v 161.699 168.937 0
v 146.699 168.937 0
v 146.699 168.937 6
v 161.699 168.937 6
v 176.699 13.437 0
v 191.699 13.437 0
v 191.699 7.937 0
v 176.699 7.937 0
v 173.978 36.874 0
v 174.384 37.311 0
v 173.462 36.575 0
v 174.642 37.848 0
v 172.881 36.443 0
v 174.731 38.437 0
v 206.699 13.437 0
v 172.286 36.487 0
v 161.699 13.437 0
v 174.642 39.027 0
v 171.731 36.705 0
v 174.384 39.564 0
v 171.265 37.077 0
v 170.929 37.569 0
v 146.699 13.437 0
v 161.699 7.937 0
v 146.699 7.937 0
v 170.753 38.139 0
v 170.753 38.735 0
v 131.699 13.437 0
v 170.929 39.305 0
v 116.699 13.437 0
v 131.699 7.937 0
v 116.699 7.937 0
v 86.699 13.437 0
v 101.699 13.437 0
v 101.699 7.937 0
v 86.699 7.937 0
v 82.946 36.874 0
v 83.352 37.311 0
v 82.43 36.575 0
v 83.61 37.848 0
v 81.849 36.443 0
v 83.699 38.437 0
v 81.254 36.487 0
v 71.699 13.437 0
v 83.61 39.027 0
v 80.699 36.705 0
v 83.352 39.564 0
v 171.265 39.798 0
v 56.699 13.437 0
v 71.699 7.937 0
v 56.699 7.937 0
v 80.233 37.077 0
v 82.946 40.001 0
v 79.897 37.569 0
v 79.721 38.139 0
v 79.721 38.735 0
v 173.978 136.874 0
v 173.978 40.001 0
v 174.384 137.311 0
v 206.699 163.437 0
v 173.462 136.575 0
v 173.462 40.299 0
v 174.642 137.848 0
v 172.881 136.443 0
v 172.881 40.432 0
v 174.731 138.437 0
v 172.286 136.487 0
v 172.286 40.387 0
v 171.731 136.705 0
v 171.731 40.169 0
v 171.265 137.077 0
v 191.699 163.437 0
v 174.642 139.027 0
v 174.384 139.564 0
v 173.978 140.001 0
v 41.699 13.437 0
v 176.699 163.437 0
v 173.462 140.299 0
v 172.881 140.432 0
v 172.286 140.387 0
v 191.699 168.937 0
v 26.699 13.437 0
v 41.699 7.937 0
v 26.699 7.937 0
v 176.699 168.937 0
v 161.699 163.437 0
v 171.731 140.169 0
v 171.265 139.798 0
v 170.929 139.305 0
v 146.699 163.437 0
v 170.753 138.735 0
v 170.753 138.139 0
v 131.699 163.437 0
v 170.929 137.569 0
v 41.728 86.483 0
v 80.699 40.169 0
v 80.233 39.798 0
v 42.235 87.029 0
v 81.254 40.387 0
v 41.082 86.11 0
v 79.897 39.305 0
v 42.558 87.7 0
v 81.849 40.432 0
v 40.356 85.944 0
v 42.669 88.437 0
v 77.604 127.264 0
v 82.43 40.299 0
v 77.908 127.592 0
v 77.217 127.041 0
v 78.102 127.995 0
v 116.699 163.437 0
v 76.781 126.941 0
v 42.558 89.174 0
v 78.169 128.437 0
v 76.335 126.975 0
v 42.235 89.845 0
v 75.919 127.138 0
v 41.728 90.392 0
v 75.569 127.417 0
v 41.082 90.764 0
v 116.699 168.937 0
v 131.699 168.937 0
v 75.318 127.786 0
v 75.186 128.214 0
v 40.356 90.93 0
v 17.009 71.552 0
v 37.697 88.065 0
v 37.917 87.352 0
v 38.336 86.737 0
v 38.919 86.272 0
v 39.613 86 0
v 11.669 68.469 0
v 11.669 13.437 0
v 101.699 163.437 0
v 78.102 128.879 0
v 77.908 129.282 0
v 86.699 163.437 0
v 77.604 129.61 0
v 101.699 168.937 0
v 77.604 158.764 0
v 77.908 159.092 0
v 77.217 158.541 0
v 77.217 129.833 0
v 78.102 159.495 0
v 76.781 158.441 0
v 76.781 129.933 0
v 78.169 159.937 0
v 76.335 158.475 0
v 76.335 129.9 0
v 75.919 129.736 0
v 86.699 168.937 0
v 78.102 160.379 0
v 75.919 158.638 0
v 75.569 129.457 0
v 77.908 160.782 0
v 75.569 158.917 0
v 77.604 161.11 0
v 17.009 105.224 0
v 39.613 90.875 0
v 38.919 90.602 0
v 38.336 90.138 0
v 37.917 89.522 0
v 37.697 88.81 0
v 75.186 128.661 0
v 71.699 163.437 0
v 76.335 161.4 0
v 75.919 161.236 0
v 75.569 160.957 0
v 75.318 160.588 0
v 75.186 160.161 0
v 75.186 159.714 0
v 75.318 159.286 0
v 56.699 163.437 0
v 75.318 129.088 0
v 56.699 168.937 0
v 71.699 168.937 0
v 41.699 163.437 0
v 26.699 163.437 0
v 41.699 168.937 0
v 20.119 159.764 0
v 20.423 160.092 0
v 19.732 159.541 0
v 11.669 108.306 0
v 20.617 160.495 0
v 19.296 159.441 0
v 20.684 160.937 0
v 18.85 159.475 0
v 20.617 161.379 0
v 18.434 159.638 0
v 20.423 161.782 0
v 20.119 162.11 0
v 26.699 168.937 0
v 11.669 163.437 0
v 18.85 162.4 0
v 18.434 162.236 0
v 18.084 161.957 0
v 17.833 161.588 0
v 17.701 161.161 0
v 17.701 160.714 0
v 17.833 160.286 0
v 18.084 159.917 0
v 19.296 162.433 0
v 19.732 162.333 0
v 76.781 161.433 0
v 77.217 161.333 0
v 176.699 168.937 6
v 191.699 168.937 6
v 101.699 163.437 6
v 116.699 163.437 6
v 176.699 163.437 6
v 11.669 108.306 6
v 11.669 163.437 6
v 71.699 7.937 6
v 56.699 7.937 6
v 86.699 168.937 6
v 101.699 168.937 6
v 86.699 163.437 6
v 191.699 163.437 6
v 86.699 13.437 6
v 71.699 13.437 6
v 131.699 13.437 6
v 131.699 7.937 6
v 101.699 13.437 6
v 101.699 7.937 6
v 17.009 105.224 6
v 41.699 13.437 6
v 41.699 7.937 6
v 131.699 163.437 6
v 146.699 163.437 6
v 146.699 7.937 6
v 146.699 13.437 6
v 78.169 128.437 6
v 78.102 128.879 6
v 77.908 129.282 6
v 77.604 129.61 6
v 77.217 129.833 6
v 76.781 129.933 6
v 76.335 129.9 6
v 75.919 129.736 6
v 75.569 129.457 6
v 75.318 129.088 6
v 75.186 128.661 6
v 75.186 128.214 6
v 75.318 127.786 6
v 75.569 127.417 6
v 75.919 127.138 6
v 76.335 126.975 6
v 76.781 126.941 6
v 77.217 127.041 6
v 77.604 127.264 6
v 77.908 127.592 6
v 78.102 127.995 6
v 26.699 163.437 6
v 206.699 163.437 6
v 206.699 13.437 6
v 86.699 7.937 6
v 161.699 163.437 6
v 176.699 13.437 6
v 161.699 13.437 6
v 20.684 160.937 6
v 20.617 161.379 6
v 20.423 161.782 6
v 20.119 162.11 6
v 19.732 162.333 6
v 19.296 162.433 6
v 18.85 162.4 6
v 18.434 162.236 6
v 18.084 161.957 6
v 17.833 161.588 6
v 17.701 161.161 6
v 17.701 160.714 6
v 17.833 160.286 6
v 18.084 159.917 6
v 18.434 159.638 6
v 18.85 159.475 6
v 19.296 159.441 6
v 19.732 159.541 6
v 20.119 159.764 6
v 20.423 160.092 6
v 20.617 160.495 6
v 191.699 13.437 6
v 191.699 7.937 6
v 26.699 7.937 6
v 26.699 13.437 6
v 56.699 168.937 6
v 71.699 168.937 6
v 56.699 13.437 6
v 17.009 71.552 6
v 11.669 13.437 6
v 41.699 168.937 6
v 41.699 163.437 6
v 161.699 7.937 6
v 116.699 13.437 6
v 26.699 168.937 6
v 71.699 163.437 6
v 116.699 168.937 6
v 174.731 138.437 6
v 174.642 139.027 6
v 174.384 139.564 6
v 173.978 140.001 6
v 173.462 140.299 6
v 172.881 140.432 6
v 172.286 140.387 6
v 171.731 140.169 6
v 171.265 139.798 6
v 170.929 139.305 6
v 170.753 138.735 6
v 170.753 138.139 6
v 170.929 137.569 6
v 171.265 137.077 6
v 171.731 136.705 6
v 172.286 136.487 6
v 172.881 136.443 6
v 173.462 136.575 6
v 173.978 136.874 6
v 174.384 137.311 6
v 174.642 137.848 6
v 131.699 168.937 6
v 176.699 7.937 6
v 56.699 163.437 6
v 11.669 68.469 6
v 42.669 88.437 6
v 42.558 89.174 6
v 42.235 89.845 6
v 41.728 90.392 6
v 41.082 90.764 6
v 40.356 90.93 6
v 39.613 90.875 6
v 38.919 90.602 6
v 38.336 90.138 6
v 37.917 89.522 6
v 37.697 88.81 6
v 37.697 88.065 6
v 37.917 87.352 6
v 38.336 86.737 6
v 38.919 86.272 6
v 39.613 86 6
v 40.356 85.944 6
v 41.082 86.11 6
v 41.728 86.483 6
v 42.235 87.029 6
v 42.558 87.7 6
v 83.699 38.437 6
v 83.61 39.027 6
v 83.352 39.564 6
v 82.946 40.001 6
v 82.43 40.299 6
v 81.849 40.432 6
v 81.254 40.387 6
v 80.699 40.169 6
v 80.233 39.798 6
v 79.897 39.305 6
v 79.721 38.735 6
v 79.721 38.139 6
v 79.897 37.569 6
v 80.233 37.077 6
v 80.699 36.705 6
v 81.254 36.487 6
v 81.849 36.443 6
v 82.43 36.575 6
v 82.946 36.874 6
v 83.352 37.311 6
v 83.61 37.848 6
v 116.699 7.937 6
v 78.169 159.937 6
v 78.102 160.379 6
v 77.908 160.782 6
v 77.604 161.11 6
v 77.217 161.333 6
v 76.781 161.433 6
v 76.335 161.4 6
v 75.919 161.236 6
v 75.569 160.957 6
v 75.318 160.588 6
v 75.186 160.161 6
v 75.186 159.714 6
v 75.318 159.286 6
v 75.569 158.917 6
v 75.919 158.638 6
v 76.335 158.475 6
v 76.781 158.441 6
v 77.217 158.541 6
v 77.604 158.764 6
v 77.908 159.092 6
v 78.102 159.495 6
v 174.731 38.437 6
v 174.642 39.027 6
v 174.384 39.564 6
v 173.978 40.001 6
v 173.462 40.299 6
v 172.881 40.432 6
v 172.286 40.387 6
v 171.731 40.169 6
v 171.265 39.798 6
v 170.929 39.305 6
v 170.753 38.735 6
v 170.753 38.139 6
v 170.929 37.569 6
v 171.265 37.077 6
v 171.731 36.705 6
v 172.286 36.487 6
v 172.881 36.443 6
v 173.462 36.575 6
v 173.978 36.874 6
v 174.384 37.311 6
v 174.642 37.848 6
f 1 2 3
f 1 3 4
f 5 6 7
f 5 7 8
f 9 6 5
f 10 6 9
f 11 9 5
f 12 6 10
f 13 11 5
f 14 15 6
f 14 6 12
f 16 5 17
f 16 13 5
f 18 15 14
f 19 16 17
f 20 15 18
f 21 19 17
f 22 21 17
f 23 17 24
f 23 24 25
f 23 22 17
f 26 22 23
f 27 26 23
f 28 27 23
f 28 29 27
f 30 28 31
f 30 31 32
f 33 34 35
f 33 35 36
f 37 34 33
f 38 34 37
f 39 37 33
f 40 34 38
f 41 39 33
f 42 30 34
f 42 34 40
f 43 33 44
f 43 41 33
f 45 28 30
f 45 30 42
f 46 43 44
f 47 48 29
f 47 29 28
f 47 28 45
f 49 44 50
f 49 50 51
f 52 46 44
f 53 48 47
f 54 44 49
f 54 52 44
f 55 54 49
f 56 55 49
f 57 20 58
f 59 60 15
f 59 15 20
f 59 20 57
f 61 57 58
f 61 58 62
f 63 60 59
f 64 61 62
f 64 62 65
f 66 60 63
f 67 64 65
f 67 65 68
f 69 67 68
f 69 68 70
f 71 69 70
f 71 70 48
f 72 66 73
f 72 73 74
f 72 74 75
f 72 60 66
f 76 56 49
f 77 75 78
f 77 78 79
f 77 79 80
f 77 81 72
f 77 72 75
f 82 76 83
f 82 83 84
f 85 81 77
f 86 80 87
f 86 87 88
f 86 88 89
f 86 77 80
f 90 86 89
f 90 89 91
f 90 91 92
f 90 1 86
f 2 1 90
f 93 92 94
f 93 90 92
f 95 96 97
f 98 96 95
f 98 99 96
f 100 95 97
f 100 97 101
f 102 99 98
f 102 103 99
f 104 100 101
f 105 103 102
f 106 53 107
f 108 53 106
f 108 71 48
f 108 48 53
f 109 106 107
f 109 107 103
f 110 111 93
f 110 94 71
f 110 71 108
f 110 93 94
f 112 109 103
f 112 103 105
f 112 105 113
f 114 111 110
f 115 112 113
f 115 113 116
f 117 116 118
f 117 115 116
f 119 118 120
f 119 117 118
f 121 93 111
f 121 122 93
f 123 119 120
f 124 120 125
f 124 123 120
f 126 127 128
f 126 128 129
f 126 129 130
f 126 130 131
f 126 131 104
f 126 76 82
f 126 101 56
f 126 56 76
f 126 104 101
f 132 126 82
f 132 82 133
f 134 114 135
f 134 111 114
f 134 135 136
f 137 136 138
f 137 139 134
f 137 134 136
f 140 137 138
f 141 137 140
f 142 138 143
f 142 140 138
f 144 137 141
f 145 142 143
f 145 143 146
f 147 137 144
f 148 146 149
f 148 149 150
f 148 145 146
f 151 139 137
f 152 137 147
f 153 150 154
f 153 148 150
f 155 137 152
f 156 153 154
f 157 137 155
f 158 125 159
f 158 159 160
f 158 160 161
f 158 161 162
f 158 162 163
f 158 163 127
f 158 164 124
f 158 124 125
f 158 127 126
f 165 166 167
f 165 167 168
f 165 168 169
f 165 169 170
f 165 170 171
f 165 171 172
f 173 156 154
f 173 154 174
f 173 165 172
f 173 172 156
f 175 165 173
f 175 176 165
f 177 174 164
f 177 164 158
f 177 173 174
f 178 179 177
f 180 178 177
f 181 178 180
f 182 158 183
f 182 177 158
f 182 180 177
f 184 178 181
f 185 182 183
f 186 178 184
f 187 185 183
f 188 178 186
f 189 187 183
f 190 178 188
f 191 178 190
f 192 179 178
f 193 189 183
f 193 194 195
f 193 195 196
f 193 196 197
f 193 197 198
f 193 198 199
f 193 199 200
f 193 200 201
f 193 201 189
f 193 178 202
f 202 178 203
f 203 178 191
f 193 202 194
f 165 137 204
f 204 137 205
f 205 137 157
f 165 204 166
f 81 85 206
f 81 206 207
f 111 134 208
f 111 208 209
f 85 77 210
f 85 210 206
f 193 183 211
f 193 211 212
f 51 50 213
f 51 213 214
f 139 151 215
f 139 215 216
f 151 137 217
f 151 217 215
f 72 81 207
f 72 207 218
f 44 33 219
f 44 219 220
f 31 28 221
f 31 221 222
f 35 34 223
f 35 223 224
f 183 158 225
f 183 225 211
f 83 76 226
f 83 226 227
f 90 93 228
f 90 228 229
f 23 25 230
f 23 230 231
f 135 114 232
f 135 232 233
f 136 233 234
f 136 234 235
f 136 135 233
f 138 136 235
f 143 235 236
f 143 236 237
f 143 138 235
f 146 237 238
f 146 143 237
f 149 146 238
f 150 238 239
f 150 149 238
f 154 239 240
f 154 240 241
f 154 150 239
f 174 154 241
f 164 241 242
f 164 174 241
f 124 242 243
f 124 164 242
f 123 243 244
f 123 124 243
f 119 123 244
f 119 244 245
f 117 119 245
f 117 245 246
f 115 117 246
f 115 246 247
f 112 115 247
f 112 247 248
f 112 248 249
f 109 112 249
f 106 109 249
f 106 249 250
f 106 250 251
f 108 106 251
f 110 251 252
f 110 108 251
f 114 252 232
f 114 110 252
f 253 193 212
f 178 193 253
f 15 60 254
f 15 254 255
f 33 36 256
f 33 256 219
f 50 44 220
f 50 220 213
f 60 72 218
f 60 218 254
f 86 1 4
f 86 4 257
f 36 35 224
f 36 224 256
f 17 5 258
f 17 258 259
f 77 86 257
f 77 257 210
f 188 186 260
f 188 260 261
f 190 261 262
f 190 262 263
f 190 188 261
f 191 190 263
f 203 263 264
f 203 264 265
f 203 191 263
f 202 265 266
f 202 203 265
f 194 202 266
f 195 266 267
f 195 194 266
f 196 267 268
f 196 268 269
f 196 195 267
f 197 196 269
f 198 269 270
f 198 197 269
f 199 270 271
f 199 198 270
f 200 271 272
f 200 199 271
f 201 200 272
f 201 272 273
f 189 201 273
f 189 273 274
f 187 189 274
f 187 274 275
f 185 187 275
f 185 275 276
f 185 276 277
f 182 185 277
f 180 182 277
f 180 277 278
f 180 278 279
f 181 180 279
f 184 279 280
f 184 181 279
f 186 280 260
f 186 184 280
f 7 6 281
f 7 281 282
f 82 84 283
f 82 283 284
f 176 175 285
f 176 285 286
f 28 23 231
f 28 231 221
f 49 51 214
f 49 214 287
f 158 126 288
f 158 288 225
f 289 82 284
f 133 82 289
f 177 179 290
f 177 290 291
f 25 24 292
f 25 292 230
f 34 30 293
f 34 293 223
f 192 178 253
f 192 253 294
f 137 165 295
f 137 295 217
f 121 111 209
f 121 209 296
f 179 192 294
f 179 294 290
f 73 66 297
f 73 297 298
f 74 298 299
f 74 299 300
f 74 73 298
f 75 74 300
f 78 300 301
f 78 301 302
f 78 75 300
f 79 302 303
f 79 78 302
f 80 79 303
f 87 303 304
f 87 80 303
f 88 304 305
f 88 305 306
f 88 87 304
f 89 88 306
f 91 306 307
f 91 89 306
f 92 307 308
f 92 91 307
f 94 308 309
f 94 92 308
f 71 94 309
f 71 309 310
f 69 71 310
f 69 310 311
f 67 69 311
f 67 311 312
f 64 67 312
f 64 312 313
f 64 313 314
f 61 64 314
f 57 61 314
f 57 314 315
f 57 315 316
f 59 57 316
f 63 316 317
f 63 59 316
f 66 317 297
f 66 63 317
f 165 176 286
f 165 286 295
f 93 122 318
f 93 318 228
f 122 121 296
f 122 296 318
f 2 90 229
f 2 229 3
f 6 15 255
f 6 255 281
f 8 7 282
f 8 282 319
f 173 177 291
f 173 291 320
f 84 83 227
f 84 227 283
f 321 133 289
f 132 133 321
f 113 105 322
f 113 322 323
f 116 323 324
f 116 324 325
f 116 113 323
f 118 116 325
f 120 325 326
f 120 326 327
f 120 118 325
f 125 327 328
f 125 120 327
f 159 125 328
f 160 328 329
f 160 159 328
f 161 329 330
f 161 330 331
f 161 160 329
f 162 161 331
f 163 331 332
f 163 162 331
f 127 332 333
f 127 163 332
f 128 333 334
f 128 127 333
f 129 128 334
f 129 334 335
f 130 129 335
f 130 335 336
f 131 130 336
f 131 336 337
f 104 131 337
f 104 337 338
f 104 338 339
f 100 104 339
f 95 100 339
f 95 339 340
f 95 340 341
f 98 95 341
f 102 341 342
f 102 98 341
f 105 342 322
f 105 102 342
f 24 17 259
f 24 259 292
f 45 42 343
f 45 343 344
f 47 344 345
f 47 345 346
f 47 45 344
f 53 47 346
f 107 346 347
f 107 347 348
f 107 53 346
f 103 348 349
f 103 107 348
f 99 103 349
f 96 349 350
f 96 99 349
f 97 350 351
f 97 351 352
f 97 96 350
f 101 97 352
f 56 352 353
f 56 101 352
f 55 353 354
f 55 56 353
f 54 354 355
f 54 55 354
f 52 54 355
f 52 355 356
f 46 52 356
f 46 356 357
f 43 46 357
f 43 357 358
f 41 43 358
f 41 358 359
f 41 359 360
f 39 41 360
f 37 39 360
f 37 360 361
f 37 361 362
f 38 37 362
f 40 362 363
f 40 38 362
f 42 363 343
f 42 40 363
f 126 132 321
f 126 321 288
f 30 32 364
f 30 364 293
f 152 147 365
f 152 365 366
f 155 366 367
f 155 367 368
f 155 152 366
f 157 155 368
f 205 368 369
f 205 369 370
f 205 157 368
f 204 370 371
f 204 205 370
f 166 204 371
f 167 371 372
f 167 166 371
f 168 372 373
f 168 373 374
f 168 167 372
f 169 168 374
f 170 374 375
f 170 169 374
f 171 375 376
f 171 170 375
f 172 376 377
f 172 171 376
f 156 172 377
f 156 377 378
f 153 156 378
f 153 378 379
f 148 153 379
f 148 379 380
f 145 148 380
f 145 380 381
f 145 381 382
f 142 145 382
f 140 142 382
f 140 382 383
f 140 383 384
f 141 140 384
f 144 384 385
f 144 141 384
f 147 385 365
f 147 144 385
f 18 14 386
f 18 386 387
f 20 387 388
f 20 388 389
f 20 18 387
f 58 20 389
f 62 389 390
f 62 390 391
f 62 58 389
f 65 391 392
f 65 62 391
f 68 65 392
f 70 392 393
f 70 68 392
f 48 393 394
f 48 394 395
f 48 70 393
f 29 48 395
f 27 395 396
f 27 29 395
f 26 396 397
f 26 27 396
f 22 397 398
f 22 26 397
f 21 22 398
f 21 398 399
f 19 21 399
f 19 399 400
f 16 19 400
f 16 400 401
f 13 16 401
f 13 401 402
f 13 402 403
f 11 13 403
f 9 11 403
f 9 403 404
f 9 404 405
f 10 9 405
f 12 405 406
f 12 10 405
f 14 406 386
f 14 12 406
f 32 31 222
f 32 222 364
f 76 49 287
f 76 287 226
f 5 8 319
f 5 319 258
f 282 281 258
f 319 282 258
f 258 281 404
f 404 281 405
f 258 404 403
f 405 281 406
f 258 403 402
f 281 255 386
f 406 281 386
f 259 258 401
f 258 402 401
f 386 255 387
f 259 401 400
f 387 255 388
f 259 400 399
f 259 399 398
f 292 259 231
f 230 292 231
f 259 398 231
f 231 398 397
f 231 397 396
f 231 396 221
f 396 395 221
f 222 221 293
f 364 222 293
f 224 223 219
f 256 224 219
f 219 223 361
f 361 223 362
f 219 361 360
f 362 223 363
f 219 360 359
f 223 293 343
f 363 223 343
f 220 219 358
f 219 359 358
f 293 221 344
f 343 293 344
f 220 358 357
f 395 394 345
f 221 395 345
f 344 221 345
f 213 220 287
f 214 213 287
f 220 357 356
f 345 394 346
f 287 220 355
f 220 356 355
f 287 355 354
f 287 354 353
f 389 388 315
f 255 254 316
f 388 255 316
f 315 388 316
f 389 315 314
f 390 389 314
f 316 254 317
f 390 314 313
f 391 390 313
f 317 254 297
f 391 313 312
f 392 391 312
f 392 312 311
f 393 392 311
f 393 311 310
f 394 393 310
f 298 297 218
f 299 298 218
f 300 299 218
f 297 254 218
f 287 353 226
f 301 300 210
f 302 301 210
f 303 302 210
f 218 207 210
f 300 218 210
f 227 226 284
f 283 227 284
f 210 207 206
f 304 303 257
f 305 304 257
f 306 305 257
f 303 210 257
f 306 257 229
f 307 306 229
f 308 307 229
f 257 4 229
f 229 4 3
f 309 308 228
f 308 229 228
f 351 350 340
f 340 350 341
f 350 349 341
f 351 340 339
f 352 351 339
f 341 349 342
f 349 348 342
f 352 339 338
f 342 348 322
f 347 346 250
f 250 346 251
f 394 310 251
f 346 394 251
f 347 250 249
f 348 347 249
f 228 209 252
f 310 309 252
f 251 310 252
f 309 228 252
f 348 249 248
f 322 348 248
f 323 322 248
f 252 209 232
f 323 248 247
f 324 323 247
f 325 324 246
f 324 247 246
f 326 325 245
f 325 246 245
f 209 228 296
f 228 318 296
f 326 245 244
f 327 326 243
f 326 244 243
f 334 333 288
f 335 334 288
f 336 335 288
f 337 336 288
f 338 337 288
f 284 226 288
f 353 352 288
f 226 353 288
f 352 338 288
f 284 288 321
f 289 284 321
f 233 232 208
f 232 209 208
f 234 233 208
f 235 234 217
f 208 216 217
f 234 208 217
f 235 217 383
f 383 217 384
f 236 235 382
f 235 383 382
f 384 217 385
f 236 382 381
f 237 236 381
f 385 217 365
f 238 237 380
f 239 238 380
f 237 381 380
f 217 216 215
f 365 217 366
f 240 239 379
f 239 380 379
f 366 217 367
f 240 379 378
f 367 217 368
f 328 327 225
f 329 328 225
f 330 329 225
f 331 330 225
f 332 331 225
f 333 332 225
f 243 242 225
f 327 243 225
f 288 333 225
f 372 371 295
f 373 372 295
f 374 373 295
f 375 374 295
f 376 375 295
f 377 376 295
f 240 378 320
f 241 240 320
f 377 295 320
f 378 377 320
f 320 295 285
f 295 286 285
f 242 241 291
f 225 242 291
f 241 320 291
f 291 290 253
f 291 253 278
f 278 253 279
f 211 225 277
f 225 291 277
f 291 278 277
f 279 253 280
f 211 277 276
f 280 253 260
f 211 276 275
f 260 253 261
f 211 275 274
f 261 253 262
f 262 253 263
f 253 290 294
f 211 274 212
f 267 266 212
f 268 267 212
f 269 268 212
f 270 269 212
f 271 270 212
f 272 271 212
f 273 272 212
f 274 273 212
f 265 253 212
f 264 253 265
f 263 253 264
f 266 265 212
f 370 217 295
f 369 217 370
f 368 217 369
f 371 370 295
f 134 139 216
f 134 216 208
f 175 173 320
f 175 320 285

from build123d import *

# Parameters (mm, degrees)
MODEL_R             = 2.5
MODEL_R_2           = 2
MODEL_R_3           = 1.5
BOSS_EXTRUDE1_DEPTH = 6


with BuildPart() as part:
    # Model → Boss-Extrude1 (new body)
    with BuildSketch(Plane.XY):
        Polygon((206.699050252, 163.437183165), (206.699050252, 13.437183165), (191.699050252, 13.437183165), (191.699050252, 7.937183165), (176.699050252, 7.937183165), (176.699050252, 13.437183165), (161.699050252, 13.437183165), (161.699050252, 7.937183165), (146.699050252, 7.937183165), (146.699050252, 13.437183165), (131.699050252, 13.437183165), (131.699050252, 7.937183165), (116.699050252, 7.937183165), (116.699050252, 13.437183165), (101.699050252, 13.437183165), (101.699050252, 7.937183165), (86.699050252, 7.937183165), (86.699050252, 13.437183165), (71.699050252, 13.437183165), (71.699050252, 7.937183165), (56.699050252, 7.937183165), (56.699050252, 13.437183165), (41.699050252, 13.437183165), (41.699050252, 7.937183165), (26.699050252, 7.937183165), (26.699050252, 13.437183165), (11.668968128, 13.437183165), (11.668968128, 68.469250485), (17.008612601, 71.552095659), (17.008612601, 105.223573885), (11.668968128, 108.306419059), (11.668968128, 163.437183165), (26.699050252, 163.437183165), (26.699050252, 168.937183165), (41.699050252, 168.937183165), (41.699050252, 163.437183165), (56.699050252, 163.437183165), (56.699050252, 168.937183165), (71.699050252, 168.937183165), (71.699050252, 163.437183165), (86.699050252, 163.437183165), (86.699050252, 168.937183165), (101.699050252, 168.937183165), (101.699050252, 163.437183165), (116.699050252, 163.437183165), (116.699050252, 168.937183165), (131.699050252, 168.937183165), (131.699050252, 163.437183165), (146.699050252, 163.437183165), (146.699050252, 168.937183165), (161.699050252, 168.937183165), (161.699050252, 163.437183165), (176.699050252, 163.437183165), (176.699050252, 168.937183165), (191.699050252, 168.937183165), (191.699050252, 163.437183165), align=None)
        with Locations((40.168968128, 88.437183165)):
            Circle(MODEL_R, mode=Mode.SUBTRACT)
        with Locations((172.731128361, 138.437183165)):
            Circle(MODEL_R_2, mode=Mode.SUBTRACT)
        with Locations((81.699050252, 38.437183165)):
            Circle(MODEL_R_2, mode=Mode.SUBTRACT)
        with Locations((172.731128361, 38.437183165)):
            Circle(MODEL_R_2, mode=Mode.SUBTRACT)
        with Locations((76.668968128, 128.437183165)):
            Circle(MODEL_R_3, mode=Mode.SUBTRACT)
        with Locations((76.668968128, 159.937183165)):
            Circle(MODEL_R_3, mode=Mode.SUBTRACT)
        with Locations((19.18400919, 160.937183165)):
            Circle(MODEL_R_3, mode=Mode.SUBTRACT)
    extrude(amount=BOSS_EXTRUDE1_DEPTH)


solid = part.part
